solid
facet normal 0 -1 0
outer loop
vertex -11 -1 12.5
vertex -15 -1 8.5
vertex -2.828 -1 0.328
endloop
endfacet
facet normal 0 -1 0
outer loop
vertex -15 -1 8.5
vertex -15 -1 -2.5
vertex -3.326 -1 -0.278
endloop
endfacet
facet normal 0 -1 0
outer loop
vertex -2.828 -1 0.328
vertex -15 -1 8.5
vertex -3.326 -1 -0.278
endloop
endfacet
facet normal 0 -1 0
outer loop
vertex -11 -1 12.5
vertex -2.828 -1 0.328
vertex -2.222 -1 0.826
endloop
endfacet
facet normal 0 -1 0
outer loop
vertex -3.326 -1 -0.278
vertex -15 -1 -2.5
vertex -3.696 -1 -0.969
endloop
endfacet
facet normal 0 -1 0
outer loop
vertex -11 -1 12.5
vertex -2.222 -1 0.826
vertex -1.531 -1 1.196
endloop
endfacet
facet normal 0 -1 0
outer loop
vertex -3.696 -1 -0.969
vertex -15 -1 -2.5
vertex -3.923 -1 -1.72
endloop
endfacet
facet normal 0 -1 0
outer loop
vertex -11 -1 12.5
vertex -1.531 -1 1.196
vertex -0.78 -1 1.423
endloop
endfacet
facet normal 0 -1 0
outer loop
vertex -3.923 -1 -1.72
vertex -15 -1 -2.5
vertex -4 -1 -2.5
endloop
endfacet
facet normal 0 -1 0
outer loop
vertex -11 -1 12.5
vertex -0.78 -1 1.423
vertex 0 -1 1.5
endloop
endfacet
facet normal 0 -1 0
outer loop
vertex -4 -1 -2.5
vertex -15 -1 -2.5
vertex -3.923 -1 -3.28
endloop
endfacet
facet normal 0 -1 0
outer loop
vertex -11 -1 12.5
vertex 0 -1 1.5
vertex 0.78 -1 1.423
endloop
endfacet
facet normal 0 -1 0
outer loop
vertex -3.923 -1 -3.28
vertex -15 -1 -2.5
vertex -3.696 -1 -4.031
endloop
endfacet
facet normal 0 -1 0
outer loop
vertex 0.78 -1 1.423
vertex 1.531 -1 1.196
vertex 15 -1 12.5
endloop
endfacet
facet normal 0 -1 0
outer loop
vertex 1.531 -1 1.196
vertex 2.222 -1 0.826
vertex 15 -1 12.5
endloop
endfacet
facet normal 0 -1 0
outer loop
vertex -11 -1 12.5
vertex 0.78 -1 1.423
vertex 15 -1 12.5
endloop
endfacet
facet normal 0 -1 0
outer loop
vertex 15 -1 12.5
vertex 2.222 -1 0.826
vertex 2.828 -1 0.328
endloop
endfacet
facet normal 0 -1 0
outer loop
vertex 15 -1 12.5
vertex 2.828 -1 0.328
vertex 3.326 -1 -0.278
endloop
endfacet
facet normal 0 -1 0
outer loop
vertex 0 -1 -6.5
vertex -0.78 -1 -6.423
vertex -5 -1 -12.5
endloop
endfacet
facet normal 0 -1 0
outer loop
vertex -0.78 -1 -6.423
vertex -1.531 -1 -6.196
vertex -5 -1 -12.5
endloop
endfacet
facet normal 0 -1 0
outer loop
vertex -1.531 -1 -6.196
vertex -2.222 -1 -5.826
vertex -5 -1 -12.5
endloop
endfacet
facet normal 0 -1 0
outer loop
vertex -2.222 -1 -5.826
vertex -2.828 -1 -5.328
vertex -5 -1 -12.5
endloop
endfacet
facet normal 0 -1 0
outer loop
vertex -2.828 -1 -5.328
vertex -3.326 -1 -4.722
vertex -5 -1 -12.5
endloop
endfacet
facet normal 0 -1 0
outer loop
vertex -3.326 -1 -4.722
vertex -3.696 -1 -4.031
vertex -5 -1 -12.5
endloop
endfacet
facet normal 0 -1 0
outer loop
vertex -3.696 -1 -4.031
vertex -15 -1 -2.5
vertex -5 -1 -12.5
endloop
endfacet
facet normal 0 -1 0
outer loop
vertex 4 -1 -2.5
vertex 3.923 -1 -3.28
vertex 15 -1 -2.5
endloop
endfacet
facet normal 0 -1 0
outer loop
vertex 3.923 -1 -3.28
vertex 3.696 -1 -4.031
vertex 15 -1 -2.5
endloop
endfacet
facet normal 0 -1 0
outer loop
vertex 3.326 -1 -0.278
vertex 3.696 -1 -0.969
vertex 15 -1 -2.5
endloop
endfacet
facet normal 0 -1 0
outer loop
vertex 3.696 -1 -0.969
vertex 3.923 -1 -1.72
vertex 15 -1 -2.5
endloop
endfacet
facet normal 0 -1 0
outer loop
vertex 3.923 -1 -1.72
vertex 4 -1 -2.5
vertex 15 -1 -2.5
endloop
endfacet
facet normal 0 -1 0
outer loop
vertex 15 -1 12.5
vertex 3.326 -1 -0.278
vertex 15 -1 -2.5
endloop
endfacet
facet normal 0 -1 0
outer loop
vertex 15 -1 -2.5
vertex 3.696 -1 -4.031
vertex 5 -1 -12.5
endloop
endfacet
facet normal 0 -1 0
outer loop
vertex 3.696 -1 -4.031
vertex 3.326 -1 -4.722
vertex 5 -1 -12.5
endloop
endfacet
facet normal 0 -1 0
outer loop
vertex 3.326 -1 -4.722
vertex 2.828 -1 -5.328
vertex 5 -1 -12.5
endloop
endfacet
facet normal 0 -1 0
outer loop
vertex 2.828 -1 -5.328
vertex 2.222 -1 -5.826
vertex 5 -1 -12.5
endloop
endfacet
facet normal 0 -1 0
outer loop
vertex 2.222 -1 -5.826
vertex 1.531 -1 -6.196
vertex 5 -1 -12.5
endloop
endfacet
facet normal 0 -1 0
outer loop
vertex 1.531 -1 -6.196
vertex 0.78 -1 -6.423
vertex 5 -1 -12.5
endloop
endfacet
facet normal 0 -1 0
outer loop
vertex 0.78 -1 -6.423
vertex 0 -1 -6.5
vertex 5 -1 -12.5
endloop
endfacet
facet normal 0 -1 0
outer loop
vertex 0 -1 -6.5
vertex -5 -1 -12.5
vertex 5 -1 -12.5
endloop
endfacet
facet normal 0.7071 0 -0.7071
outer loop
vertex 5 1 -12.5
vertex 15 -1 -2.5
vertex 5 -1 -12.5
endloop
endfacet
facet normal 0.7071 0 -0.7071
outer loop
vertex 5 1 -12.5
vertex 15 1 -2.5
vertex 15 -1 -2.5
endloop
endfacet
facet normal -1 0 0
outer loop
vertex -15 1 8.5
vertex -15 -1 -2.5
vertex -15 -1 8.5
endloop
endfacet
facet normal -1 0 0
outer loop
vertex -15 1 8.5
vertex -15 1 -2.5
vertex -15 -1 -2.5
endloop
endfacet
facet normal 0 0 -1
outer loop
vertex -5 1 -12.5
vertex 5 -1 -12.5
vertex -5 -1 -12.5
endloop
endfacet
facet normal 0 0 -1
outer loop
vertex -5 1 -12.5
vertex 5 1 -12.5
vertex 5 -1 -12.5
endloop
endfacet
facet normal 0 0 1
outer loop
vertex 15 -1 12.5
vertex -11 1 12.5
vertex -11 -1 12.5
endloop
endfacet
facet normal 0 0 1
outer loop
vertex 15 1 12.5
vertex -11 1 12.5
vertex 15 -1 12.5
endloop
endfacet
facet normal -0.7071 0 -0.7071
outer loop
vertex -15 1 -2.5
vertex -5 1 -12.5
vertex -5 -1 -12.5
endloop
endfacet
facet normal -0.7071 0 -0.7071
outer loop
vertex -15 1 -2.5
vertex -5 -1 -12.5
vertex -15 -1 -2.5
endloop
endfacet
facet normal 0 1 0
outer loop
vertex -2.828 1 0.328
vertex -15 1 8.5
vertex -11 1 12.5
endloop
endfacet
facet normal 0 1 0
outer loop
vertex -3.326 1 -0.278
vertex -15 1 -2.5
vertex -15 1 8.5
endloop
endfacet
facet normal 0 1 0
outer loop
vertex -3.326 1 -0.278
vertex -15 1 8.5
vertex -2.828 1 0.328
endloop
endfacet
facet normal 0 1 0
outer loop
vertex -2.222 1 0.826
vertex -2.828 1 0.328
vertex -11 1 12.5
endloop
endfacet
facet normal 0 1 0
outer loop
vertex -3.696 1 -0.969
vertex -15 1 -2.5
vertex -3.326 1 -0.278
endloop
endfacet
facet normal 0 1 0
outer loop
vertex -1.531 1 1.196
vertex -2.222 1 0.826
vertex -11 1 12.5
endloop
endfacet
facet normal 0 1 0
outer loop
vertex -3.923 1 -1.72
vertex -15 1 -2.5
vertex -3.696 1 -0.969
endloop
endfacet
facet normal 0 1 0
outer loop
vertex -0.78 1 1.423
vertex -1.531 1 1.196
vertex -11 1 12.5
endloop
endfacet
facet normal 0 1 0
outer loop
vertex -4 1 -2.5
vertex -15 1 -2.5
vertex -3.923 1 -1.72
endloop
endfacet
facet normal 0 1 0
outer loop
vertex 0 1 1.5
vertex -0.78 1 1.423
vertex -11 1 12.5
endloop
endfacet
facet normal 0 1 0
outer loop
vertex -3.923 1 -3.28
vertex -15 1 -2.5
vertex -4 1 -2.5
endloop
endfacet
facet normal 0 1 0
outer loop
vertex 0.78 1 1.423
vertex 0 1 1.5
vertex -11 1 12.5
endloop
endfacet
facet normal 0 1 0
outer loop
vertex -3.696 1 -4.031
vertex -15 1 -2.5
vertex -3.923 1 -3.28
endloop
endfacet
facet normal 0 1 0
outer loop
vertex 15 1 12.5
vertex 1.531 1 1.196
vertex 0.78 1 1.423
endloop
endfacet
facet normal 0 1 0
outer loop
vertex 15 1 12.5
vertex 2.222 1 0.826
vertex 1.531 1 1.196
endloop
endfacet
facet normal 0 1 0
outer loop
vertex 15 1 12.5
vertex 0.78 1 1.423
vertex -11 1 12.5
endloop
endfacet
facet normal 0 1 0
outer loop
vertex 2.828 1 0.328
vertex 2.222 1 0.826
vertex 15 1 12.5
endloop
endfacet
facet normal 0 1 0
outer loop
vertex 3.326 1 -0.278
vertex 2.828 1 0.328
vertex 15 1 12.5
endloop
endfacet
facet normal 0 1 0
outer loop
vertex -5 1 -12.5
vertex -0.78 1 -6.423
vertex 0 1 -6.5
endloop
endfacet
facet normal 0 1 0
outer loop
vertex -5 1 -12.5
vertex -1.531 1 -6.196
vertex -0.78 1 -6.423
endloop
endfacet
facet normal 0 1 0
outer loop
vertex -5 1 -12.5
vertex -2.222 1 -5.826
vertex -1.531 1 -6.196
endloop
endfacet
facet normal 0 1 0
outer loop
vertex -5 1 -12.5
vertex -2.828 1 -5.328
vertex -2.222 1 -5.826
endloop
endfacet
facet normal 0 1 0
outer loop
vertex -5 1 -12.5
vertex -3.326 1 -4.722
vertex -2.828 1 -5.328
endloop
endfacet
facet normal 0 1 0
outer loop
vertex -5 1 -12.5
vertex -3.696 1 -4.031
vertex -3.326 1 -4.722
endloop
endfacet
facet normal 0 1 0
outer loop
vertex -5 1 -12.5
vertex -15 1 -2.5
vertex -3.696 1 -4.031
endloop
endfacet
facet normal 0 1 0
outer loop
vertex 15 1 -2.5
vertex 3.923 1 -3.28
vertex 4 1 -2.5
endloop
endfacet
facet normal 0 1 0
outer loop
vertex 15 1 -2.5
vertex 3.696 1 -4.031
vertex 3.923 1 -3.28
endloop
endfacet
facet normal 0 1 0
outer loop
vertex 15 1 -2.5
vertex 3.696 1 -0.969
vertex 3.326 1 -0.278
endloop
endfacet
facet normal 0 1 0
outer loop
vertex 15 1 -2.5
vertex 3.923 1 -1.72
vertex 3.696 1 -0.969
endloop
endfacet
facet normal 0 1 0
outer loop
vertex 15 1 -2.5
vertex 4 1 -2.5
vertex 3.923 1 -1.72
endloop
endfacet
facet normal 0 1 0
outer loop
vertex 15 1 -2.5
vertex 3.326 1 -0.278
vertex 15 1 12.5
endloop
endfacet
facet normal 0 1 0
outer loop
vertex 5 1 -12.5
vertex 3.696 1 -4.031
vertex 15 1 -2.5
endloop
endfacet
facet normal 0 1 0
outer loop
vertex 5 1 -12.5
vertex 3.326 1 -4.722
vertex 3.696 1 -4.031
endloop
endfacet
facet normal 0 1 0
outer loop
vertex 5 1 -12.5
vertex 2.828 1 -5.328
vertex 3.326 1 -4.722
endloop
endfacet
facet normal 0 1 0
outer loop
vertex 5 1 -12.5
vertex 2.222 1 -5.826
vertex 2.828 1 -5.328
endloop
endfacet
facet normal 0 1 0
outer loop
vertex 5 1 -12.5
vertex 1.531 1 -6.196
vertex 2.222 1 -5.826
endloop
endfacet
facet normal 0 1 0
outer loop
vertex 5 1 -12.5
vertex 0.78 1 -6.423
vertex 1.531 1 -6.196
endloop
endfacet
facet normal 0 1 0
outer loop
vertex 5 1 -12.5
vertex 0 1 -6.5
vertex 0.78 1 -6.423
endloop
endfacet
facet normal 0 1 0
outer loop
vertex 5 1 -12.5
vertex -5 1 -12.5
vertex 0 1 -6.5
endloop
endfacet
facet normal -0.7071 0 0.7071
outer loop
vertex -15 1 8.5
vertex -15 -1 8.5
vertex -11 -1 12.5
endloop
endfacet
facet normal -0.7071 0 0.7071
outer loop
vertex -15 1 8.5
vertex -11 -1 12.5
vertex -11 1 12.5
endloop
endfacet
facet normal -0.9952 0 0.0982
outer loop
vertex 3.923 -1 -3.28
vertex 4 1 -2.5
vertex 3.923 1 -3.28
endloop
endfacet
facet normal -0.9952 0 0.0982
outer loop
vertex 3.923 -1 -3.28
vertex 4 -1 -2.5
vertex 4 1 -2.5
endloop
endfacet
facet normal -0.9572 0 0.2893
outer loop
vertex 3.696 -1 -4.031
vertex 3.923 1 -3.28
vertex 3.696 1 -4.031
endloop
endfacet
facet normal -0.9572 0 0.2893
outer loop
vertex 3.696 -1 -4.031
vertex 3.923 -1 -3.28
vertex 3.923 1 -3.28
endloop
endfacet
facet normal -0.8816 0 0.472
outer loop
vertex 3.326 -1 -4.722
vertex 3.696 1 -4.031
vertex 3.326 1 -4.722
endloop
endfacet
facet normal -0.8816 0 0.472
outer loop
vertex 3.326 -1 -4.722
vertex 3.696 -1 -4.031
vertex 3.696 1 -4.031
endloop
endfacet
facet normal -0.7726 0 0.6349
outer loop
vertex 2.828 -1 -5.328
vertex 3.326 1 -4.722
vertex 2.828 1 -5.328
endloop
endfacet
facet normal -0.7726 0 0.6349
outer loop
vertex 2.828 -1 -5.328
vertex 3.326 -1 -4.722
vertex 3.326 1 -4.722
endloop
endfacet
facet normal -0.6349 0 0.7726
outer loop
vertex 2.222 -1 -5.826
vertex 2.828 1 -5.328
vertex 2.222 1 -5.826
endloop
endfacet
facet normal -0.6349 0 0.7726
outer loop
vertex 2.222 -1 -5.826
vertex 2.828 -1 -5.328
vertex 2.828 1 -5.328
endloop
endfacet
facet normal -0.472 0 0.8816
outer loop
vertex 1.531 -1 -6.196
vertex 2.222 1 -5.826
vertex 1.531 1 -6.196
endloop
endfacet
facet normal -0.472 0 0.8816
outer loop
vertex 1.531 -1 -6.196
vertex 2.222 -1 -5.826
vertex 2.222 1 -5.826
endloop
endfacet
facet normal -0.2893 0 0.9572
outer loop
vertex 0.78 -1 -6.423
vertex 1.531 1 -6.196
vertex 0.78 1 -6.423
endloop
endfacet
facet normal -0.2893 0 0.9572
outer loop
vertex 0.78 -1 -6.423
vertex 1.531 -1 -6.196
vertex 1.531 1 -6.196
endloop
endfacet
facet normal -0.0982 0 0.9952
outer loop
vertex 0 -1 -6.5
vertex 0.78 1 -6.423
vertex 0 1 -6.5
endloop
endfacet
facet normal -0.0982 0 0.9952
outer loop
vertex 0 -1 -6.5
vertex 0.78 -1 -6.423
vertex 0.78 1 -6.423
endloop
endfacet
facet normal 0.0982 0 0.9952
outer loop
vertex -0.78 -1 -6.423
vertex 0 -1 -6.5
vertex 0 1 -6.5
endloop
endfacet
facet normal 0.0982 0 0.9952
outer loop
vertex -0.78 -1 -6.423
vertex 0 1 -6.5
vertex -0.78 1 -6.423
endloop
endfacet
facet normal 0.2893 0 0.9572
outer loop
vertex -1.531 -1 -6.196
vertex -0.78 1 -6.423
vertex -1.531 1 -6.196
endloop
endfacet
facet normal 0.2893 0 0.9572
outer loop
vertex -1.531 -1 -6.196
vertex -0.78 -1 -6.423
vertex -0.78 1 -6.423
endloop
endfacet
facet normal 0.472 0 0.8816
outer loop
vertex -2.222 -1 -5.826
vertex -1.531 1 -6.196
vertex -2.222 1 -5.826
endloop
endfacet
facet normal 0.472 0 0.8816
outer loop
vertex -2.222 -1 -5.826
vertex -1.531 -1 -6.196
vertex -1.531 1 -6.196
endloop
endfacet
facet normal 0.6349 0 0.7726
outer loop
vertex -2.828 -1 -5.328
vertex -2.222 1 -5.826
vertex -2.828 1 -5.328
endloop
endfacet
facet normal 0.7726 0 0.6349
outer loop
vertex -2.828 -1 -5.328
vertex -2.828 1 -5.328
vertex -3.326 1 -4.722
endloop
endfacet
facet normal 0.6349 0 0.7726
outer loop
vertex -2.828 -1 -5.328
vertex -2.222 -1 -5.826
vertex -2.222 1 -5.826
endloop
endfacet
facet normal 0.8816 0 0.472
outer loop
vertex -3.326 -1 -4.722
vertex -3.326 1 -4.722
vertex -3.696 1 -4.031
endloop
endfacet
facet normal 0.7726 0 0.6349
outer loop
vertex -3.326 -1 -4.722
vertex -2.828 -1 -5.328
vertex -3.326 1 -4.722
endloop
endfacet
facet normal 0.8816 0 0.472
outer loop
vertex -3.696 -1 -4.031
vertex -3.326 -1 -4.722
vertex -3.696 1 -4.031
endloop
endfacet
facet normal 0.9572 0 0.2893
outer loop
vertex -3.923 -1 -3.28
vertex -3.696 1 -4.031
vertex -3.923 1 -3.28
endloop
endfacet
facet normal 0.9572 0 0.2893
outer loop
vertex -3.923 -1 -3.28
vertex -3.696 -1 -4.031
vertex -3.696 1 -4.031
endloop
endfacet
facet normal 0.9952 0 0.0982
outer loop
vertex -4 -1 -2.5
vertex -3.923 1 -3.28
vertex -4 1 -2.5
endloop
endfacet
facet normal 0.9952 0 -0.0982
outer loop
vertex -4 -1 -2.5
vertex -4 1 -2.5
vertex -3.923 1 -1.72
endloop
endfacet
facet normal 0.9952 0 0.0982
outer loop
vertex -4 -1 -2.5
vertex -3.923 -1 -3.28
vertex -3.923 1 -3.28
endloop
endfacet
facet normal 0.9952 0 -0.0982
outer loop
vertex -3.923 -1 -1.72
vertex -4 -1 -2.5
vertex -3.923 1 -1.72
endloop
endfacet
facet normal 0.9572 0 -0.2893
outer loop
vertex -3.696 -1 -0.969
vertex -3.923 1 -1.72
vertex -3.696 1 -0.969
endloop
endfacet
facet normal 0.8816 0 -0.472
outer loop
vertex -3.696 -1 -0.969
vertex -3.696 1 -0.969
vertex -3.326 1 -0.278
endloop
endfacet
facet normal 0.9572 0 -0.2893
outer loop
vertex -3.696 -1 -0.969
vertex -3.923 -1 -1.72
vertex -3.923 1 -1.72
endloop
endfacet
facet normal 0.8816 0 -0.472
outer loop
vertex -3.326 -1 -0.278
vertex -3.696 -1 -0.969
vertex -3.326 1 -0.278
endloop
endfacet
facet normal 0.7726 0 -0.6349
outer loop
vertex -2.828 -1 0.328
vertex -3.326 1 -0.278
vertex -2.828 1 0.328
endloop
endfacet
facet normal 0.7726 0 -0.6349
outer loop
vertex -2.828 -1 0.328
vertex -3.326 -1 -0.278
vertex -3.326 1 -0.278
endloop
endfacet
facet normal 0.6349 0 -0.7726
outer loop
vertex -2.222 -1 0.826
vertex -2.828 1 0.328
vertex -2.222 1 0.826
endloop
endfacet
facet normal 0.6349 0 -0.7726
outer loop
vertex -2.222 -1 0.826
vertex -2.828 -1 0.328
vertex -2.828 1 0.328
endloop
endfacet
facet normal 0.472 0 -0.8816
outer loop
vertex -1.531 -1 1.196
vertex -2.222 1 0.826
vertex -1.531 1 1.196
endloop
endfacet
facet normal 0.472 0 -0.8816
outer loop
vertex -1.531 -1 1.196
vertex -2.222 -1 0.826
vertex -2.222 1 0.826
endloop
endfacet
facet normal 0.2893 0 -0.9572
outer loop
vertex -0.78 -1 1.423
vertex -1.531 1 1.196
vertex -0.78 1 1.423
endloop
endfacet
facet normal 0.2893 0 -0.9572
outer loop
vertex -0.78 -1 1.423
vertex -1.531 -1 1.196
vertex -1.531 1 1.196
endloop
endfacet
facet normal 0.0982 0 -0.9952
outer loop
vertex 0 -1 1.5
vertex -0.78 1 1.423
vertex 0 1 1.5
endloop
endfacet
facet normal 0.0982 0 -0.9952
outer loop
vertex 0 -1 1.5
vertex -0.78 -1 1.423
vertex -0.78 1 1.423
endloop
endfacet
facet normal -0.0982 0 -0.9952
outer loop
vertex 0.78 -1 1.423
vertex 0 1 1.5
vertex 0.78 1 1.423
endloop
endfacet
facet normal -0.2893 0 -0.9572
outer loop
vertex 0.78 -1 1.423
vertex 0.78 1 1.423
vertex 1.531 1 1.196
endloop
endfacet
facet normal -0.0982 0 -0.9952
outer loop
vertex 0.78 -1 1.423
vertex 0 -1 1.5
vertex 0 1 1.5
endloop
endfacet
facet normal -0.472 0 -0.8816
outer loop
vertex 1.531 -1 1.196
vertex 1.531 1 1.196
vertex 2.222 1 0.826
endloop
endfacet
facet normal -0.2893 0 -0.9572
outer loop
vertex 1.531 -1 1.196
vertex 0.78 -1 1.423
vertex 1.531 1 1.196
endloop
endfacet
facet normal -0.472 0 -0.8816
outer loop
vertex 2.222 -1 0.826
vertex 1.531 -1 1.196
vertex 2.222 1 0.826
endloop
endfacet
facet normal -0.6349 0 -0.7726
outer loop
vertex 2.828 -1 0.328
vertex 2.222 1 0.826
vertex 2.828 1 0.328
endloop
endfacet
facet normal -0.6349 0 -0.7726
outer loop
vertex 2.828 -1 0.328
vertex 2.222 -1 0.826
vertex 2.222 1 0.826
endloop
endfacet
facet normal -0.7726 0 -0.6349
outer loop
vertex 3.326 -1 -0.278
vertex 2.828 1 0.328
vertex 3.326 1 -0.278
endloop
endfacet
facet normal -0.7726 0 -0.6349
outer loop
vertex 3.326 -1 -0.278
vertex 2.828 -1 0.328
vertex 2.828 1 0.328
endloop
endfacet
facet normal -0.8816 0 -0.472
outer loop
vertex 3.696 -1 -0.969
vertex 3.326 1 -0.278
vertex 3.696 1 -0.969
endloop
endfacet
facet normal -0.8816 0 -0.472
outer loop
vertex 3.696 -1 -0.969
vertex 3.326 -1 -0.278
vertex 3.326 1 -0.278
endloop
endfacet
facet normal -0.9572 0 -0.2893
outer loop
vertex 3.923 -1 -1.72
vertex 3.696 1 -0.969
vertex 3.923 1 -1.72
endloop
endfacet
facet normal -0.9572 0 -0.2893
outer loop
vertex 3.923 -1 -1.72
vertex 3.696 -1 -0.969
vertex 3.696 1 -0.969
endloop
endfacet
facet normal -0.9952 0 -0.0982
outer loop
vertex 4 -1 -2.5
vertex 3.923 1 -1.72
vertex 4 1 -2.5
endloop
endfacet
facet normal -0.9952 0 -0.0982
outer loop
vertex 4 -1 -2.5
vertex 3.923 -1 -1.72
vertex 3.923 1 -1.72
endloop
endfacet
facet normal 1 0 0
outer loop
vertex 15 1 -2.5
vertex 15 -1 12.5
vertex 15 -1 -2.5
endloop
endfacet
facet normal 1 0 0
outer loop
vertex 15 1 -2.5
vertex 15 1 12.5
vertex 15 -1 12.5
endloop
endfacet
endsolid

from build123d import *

# Parameters (mm, degrees)
SKETCH1_R           = 4
BOSS_EXTRUDE1_DEPTH = 1
CHAMFER1_SIZE       = 4


with BuildPart() as part:
    # Sketch1 → Boss-Extrude1 (new body, symmetric)
    with BuildSketch(Plane(origin=(0, 0, 0), x_dir=(1, 0, 0), z_dir=(0, 1, 0))):
        Polygon((5, 12.5), (-5, 12.5), (-15, 2.5), (-15, -12.5), (15, -12.5), (15, 2.5), align=None)
        with Locations((0, 2.5)):
            Circle(SKETCH1_R, mode=Mode.SUBTRACT)
    extrude(amount=BOSS_EXTRUDE1_DEPTH, both=True)

    # Chamfer1
    chamfer1_edges = [part.edges().sort_by_distance(p)[0] for p in [
        (-15, 0, 12.5),
    ]]
    chamfer(chamfer1_edges, length=CHAMFER1_SIZE)


solid = part.part
